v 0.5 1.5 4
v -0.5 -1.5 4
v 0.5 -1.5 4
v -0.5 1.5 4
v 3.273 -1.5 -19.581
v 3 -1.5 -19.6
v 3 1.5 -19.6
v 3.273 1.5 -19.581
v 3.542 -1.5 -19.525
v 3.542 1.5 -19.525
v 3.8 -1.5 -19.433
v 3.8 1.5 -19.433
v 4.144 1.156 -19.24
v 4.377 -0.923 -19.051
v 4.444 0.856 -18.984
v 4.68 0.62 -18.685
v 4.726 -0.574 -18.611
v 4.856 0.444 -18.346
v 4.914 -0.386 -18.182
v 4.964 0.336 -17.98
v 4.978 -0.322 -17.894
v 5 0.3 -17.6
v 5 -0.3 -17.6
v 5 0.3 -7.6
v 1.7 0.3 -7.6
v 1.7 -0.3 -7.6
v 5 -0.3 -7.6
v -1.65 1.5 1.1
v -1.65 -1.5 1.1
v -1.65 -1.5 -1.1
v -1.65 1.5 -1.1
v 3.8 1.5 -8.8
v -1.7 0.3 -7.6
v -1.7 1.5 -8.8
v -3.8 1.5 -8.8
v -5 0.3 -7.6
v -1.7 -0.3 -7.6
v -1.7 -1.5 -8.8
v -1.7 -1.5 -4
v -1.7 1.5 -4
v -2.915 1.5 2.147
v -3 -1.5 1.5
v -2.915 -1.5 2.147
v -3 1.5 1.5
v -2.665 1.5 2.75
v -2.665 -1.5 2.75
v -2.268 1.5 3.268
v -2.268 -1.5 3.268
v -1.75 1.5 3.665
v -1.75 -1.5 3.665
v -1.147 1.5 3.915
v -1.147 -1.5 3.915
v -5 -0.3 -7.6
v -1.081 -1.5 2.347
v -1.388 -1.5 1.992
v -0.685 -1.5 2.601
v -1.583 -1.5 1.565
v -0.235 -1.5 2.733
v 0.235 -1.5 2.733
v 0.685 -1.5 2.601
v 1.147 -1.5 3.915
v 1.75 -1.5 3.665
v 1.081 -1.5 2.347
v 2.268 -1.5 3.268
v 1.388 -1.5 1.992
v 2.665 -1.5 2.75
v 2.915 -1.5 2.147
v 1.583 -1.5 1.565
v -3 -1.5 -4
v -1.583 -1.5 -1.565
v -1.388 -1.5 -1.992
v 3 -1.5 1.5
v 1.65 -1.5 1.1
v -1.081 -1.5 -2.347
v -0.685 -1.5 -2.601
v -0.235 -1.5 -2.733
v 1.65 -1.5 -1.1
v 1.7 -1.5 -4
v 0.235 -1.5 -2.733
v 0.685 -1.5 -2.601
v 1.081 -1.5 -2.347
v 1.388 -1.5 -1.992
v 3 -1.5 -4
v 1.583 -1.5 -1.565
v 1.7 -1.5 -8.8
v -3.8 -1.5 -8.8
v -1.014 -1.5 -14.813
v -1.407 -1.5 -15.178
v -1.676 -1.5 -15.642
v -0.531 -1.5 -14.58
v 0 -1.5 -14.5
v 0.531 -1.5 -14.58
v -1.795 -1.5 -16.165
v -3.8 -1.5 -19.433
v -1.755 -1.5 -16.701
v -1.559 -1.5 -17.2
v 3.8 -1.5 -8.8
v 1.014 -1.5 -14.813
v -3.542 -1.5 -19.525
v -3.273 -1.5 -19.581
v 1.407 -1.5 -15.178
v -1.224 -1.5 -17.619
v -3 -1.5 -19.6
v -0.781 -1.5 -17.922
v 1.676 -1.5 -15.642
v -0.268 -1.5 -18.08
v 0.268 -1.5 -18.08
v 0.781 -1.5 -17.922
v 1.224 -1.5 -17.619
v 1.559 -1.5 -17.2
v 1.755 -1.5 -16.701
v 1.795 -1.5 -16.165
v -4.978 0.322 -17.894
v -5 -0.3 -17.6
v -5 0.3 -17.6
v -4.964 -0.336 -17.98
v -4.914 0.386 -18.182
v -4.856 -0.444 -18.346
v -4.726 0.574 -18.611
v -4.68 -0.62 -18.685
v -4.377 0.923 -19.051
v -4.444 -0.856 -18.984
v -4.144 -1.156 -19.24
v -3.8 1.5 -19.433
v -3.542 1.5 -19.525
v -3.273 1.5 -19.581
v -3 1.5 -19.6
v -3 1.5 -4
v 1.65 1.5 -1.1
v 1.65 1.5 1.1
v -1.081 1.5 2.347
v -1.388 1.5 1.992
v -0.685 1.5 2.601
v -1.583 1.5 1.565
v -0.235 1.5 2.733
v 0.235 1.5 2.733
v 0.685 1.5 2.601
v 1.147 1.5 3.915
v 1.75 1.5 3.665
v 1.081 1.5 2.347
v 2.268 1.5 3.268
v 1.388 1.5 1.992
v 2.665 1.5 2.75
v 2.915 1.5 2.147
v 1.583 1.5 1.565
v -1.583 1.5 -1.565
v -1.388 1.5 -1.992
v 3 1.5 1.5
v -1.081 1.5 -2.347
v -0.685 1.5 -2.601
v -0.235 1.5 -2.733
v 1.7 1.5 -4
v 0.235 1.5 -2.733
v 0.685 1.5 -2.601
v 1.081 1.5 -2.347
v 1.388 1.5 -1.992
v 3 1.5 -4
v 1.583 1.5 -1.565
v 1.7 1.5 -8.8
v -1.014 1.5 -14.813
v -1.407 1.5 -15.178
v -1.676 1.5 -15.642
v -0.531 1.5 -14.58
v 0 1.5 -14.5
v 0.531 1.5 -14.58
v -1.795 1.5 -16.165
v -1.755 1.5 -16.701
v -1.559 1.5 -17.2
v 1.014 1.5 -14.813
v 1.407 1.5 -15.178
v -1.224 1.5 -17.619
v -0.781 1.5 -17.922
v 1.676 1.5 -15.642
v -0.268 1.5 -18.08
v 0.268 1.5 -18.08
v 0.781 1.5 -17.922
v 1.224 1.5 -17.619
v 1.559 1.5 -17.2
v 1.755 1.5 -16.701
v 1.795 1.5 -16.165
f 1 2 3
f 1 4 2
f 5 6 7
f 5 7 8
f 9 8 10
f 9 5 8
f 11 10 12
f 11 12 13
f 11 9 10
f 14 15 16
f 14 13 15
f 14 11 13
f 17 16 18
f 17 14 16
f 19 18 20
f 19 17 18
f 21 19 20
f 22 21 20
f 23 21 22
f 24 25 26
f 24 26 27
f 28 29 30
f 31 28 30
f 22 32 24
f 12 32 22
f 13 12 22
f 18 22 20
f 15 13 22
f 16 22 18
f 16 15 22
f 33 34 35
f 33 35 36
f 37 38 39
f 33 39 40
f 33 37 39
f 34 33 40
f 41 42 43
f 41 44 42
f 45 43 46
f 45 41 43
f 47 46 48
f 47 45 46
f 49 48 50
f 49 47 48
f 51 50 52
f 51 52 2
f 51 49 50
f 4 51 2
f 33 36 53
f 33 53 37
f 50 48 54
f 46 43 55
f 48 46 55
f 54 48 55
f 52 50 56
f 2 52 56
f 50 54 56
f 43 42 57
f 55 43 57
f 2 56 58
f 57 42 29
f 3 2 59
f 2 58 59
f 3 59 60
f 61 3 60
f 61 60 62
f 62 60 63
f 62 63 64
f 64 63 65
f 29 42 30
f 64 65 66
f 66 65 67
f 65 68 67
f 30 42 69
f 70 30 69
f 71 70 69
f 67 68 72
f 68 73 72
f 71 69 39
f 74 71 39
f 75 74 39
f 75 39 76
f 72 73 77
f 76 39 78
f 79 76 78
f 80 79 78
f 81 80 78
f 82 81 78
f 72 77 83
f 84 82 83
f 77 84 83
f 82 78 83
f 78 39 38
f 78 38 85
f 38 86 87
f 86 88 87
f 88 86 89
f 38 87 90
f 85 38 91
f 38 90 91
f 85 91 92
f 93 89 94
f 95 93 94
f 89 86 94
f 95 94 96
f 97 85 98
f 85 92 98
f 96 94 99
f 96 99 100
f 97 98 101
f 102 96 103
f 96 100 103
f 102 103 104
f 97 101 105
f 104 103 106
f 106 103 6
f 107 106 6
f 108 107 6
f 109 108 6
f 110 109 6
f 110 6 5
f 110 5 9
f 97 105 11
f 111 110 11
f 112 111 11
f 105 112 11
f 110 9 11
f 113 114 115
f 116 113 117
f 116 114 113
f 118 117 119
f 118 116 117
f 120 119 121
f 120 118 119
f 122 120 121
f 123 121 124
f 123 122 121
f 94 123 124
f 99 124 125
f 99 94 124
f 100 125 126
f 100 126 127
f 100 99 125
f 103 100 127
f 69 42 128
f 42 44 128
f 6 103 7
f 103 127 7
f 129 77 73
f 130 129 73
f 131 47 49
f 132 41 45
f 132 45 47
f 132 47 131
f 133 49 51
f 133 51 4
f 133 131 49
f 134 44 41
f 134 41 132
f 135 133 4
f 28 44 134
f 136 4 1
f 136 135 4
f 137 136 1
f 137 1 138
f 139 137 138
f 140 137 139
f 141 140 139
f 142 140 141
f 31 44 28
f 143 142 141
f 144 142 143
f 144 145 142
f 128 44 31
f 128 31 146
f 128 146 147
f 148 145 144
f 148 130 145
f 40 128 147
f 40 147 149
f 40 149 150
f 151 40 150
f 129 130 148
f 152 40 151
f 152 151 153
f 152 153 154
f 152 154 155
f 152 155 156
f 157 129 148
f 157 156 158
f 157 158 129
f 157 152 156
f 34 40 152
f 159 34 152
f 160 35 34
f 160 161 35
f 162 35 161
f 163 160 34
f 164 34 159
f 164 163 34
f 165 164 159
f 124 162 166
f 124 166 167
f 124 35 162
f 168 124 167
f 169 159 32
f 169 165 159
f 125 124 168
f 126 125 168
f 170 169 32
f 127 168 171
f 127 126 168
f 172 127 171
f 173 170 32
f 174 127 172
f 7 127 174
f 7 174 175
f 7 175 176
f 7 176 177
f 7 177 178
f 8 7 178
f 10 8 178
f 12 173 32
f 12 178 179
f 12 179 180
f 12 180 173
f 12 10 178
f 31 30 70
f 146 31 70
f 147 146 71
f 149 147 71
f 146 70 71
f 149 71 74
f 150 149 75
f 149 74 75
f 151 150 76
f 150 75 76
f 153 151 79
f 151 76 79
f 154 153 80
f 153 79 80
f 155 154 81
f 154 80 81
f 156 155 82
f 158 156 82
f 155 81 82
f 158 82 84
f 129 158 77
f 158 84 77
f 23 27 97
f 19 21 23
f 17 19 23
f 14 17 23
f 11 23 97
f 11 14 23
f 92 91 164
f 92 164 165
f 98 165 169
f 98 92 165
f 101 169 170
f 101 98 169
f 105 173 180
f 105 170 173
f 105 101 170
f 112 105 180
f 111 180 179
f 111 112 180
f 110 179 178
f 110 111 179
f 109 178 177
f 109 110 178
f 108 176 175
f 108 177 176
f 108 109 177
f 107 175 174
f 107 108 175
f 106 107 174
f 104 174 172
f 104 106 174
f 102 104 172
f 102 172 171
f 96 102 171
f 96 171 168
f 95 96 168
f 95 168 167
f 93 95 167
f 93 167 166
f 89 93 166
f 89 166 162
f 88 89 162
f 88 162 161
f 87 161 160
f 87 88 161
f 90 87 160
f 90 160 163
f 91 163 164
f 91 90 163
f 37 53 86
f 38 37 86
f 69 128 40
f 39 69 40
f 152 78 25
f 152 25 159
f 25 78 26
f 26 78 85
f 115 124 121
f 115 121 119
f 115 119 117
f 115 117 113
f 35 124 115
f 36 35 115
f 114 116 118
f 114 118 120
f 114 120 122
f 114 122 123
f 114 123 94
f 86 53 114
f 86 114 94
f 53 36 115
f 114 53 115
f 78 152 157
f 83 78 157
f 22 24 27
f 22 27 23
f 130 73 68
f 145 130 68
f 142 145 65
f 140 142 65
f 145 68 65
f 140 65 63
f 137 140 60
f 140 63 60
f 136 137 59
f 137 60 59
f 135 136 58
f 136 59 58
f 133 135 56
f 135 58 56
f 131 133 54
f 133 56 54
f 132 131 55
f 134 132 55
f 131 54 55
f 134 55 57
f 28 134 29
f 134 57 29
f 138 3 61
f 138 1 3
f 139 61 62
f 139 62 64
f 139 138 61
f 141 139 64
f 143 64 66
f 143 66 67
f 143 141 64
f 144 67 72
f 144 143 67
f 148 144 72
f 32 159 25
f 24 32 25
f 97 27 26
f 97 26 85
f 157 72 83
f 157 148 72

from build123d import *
from OCP.BRepFilletAPI import BRepFilletAPI_MakeFillet

# Parameters (mm, degrees)
SKETCH1_W               = 6
SKETCH1_H               = 8
BOSS_EXTRUDE1_DEPTH     = 1.5
SKETCH2_W               = 3.4
SKETCH2_H               = 3.6
BOSS_EXTRUDE2_DEPTH     = 1.5
SKETCH3_W               = 10
SKETCH3_H               = 12
BOSS_EXTRUDE3_DEPTH     = 1.5
FILLET1_R1              = 2
FILLET1_R2              = 2.5
CUT_EXTRUDE2_DEPTH      = 21.283244316
CUT_EXTRUDE2_DEPTH_BACK = 21.283244316
SKETCH5_R               = 1.8
CHAMFER3_SIZE           = 1.2


with BuildPart() as part:
    # Sketch1 → Boss-Extrude1 (new, symmetric)
    with BuildSketch(Plane(origin=(0, 0, 0), x_dir=(1, 0, 0), z_dir=(0, 1, 0))):
        Rectangle(SKETCH1_W, SKETCH1_H)
    extrude(amount=BOSS_EXTRUDE1_DEPTH, both=True)

    # Sketch2 → Boss-Extrude2 (add, symmetric)
    with BuildSketch(Plane(origin=(0, 0, 0), x_dir=(1, 0, 0), z_dir=(0, 1, 0))):
        with Locations((0, 5.8)):
            Rectangle(SKETCH2_W, SKETCH2_H)
    extrude(amount=BOSS_EXTRUDE2_DEPTH, both=True)

    # Sketch3 → Boss-Extrude3 (add, symmetric)
    with BuildSketch(Plane(origin=(0, 0, 0), x_dir=(1, 0, 0), z_dir=(0, 1, 0))):
        with Locations((0, 13.6)):
            Rectangle(SKETCH3_W, SKETCH3_H)
    extrude(amount=BOSS_EXTRUDE3_DEPTH, both=True)

    # Fillet1: one fillet with a radius per group of edges: ONE call of the kernel's fillet builder (fillet() takes one radius for all edges)
    fillet1_edges_1 = [part.edges().sort_by_distance(p)[0] for p in [
        (-5, 0, -19.6),
        (5, 0, -19.6),
    ]]
    fillet1_edges_2 = [part.edges().sort_by_distance(p)[0] for p in [
        (-3, 0, 4),
        (3, 0, 4),
    ]]
    fillet1 = BRepFilletAPI_MakeFillet(part.part.solid().wrapped)
    for e in fillet1_edges_1:
        fillet1.Add(FILLET1_R1, e.wrapped)
    for e in fillet1_edges_2:
        fillet1.Add(FILLET1_R2, e.wrapped)
    add(Compound.cast(fillet1.Shape()), mode=Mode.REPLACE)

    # Sketch5 → Cut-Extrude2 (cut, two sides: drawn at the far end of the back side and taken through both)
    with BuildSketch(Plane(origin=(0, 0, 0), x_dir=(1, 0, 0), z_dir=(0, 1, 0)).offset(-CUT_EXTRUDE2_DEPTH_BACK)):
        with Locations(Location((0, 16.3, 0), (0, 0, 270))):
            Circle(SKETCH5_R)
        with BuildLine():
            Line((-1.65, -1.1), (-1.65, 1.1))
            ThreePointArc((-1.65, 1.1), (0, 2.75), (1.65, 1.1))
            Line((1.65, 1.1), (1.65, -1.1))
            ThreePointArc((1.65, -1.1), (0, -2.75), (-1.65, -1.1))
        make_face()
    extrude(amount=CUT_EXTRUDE2_DEPTH + CUT_EXTRUDE2_DEPTH_BACK, mode=Mode.SUBTRACT)

    # Chamfer3
    # the kernel refuses this chamfer: 1.2 mm, written as the material it takes off along each edge
    with BuildSketch(Plane(origin=(8.086019586, -1.5, -7.6), x_dir=(0, 0.9996219169112968, 0.027495876610586632), z_dir=(-1, 0, 0)), Plane(origin=(-1.7, -1.5, -7.6), x_dir=(0, 0.9996219169112968, 0.027495876610586632), z_dir=(-1, 0, 0)), Plane(origin=(-1.7, 1.5, -7.6), x_dir=(0, 0.027495876610586483, -0.9996219169112968), z_dir=(-1, 0, 0)), Plane(origin=(8.086019586, 1.5, -7.6), x_dir=(0, 0.027495876610586483, -0.9996219169112968), z_dir=(-1, 0, 0))) as chamfer3_piece_1:
        Polygon((CHAMFER3_SIZE * 0.999621916911, CHAMFER3_SIZE * 0.0274958766106), (-CHAMFER3_SIZE * 0.0274958766106, CHAMFER3_SIZE * 0.999621916911), (0, 0), align=None)
    extrude(amount=6.386019586, mode=Mode.SUBTRACT)
    with BuildSketch(Plane(origin=(5, -1.5, -20.686019586), x_dir=(0.027495876610586632, 0.9996219169112968, 0), z_dir=(0, 0, 1)), Plane(origin=(5, 1.5, -20.686019586), x_dir=(-0.9996219169112968, 0.027495876610586452, 0), z_dir=(0, 0, 1)), Plane(origin=(-5, -1.5, -4.513980414), x_dir=(-0.027495876610586632, 0.9996219169112968, 0), z_dir=(0, 0, -1)), Plane(origin=(-5, 1.5, -4.513980414), x_dir=(0.9996219169112968, 0.027495876610586452, 0), z_dir=(0, 0, -1))) as chamfer3_piece_2:
        Polygon((CHAMFER3_SIZE * 0.999621916911, CHAMFER3_SIZE * 0.0274958766106), (-CHAMFER3_SIZE * 0.0274958766106, CHAMFER3_SIZE * 0.999621916911), (0, 0), align=None)
    extrude(amount=16.172039171, mode=Mode.SUBTRACT)


solid = part.part
